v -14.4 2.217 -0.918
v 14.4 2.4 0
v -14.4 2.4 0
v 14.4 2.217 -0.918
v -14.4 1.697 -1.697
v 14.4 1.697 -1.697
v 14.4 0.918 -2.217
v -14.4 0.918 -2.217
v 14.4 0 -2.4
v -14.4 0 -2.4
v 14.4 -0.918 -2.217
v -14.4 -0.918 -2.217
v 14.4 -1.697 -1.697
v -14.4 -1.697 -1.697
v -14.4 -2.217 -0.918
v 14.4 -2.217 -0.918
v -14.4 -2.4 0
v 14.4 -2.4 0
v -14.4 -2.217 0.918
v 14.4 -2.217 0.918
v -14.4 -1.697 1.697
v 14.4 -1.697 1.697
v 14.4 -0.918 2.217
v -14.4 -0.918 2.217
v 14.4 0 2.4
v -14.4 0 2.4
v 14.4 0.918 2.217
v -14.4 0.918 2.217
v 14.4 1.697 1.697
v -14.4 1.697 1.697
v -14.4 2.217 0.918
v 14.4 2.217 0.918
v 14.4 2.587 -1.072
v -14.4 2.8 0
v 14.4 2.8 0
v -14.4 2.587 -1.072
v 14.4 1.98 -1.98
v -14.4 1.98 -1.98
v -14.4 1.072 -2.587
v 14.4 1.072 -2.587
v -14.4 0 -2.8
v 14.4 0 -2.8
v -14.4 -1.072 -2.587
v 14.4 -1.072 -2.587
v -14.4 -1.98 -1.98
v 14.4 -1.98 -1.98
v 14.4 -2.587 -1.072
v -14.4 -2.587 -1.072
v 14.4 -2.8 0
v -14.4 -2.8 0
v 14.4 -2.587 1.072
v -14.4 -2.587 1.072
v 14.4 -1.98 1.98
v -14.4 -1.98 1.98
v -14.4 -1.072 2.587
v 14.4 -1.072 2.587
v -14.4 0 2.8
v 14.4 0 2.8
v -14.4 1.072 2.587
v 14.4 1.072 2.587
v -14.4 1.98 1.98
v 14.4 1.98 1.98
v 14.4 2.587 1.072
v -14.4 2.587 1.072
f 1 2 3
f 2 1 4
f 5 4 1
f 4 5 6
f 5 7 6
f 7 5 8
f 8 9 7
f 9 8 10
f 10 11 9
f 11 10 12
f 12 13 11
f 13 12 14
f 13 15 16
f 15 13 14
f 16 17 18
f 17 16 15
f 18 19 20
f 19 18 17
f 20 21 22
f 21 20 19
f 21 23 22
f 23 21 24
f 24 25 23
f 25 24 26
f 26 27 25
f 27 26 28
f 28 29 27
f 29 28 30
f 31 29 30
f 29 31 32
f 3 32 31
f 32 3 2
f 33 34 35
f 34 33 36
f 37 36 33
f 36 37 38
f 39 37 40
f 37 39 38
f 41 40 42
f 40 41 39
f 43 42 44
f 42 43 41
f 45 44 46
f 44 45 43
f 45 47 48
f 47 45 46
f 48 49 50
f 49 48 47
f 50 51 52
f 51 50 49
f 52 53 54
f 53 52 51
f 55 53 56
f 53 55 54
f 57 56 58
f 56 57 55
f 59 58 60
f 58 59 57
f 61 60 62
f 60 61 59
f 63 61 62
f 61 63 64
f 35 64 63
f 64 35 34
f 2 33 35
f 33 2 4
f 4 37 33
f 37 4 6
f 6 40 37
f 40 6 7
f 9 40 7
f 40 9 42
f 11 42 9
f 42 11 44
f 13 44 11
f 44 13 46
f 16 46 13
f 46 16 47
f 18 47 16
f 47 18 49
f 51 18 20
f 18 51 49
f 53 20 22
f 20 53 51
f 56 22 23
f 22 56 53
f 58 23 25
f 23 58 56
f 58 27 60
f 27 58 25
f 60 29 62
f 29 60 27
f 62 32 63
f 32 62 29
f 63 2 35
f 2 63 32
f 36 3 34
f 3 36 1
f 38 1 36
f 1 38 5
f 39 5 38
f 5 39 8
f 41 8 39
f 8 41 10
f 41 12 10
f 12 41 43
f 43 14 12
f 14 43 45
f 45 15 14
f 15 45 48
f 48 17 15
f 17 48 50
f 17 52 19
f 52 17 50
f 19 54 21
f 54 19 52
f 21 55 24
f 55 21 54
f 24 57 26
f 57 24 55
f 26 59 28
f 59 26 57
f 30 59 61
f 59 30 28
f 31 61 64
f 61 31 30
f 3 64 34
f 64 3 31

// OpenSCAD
// file: ../p/4-4edge.scad
use <../lib.scad>
function ldraw_lib__4_4edge() = [
// 0 Circle 1.0
// 0 Name: 4-4edge.dat
// 0 Author: James Jessiman
// 0 !LDRAW_ORG Primitive UPDATE 2017-01
// 0 !LICENSE Licensed under CC BY 2.0 and CC BY 4.0 : see CAreadme.txt
// 
// 0 BFC CERTIFY CCW
  [0,"BFC","CERTIFY"],
  [0,"BFC","CCW"],
// 
// 0 !HISTORY 1998-12-15 [PTadmin] Official Update 1998-10
// 0 !HISTORY 2005-12-28 [PTadmin] Official Update 2005-01
// 0 !HISTORY 2007-06-24 [PTadmin] Header formatted for Contributor Agreement
// 0 !HISTORY 2008-07-01 [PTadmin] Official Update 2008-01
// 0 !HISTORY 2017-01-15 [Steffen] BFCed
// 0 !HISTORY 2017-12-30 [PTadmin] Official Update 2017-01
// 
// 
// 2 24 1 0 0 0.9239 0 0.3827
  [2,24,1,0,0,0.9239,0,0.3827],
// 2 24 0.9239 0 0.3827 0.7071 0 0.7071
  [2,24,0.9239,0,0.3827,0.7071,0,0.7071],
// 2 24 0.7071 0 0.7071 0.3827 0 0.9239
  [2,24,0.7071,0,0.7071,0.3827,0,0.9239],
// 2 24 0.3827 0 0.9239 0 0 1
  [2,24,0.3827,0,0.9239,0,0,1],
// 2 24 0 0 1 -0.3827 0 0.9239
  [2,24,0,0,1,-0.3827,0,0.9239],
// 2 24 -0.3827 0 0.9239 -0.7071 0 0.7071
  [2,24,-0.3827,0,0.9239,-0.7071,0,0.7071],
// 2 24 -0.7071 0 0.7071 -0.9239 0 0.3827
  [2,24,-0.7071,0,0.7071,-0.9239,0,0.3827],
// 2 24 -0.9239 0 0.3827 -1 0 -0
  [2,24,-0.9239,0,0.3827,-1,0,-0],
// 2 24 -1 0 -0 -0.9239 0 -0.3827
  [2,24,-1,0,-0,-0.9239,0,-0.3827],
// 2 24 -0.9239 0 -0.3827 -0.7071 0 -0.7071
  [2,24,-0.9239,0,-0.3827,-0.7071,0,-0.7071],
// 2 24 -0.7071 0 -0.7071 -0.3827 0 -0.9239
  [2,24,-0.7071,0,-0.7071,-0.3827,0,-0.9239],
// 2 24 -0.3827 0 -0.9239 0 0 -1
  [2,24,-0.3827,0,-0.9239,0,0,-1],
// 2 24 0 0 -1 0.3827 0 -0.9239
  [2,24,0,0,-1,0.3827,0,-0.9239],
// 2 24 0.3827 0 -0.9239 0.7071 0 -0.7071
  [2,24,0.3827,0,-0.9239,0.7071,0,-0.7071],
// 2 24 0.7071 0 -0.7071 0.9239 0 -0.3827
  [2,24,0.7071,0,-0.7071,0.9239,0,-0.3827],
// 2 24 0.9239 0 -0.3827 1 0 0
  [2,24,0.9239,0,-0.3827,1,0,0],
];
module ldraw_lib__4_4edge(step=0, col=false, unit=2/5, alt=false, line=0.2, solid=!$preview)
    makepoly(ldraw_lib__4_4edge(), step=step, col=col, unit=unit, alt=alt, line=line, solid=solid);
ldraw_lib__4_4edge(line=0.2);
// file: ../p/4-4cyli.scad
use <../lib.scad>
function ldraw_lib__4_4cyli() = [
// 0 Cylinder 1.0
// 0 Name: 4-4cyli.dat
// 0 Author: James Jessiman
// 0 !LDRAW_ORG Primitive UPDATE 2005-01
// 0 !LICENSE Licensed under CC BY 2.0 and CC BY 4.0 : see CAreadme.txt
// 
// 0 BFC CERTIFY CCW
  [0,"BFC","CERTIFY"],
  [0,"BFC","CCW"],
// 
// 0 !HISTORY 1998-12-15 [PTadmin] Official Update 1998-10
// 0 !HISTORY 2002-03-23 [sbliss] Added BFC statement; merged headers from files in distributions LDraw 0.27 and Complete.
// 0 !HISTORY 2002-04-25 [PTadmin] Official Update 2002-02
// 0 !HISTORY 2004-12-14 [guyvivan] BFC CCW
// 0 !HISTORY 2005-12-28 [PTadmin] Official Update 2005-01
// 0 !HISTORY 2007-06-24 [PTadmin] Header formatted for Contributor Agreement
// 0 !HISTORY 2008-07-01 [PTadmin] Official Update 2008-01
// 
// 
// 4 16 1 1 0 0.9239 1 0.3827 0.9239 0 0.3827 1 0 0
  [4,16,1,1,0,0.9239,1,0.3827,0.9239,0,0.3827,1,0,0],
// 5 24 1 0 0 1 1 0 0.9239 0 0.3827 0.9239 0 -0.3827
  [5,24,1,0,0,1,1,0,0.9239,0,0.3827,0.9239,0,-0.3827],
// 4 16 0.9239 1 0.3827 0.7071 1 0.7071 0.7071 0 0.7071 0.9239 0 0.3827
  [4,16,0.9239,1,0.3827,0.7071,1,0.7071,0.7071,0,0.7071,0.9239,0,0.3827],
// 5 24 0.9239 0 0.3827 0.9239 1 0.3827 0.7071 0 0.7071 1 0 0
  [5,24,0.9239,0,0.3827,0.9239,1,0.3827,0.7071,0,0.7071,1,0,0],
// 4 16 0.7071 1 0.7071 0.3827 1 0.9239 0.3827 0 0.9239 0.7071 0 0.7071
  [4,16,0.7071,1,0.7071,0.3827,1,0.9239,0.3827,0,0.9239,0.7071,0,0.7071],
// 5 24 0.7071 0 0.7071 0.7071 1 0.7071 0.3827 0 0.9239 0.9239 0 0.3827
  [5,24,0.7071,0,0.7071,0.7071,1,0.7071,0.3827,0,0.9239,0.9239,0,0.3827],
// 4 16 0.3827 1 0.9239 0 1 1 0 0 1 0.3827 0 0.9239
  [4,16,0.3827,1,0.9239,0,1,1,0,0,1,0.3827,0,0.9239],
// 5 24 0.3827 0 0.9239 0.3827 1 0.9239 0 0 1 0.7071 0 0.7071
  [5,24,0.3827,0,0.9239,0.3827,1,0.9239,0,0,1,0.7071,0,0.7071],
// 4 16 0 1 1 -0.3827 1 0.9239 -0.3827 0 0.9239 0 0 1
  [4,16,0,1,1,-0.3827,1,0.9239,-0.3827,0,0.9239,0,0,1],
// 5 24 0 0 1 0 1 1 -0.3827 0 0.9239 0.3827 0 0.9239
  [5,24,0,0,1,0,1,1,-0.3827,0,0.9239,0.3827,0,0.9239],
// 4 16 -0.3827 1 0.9239 -0.7071 1 0.7071 -0.7071 0 0.7071 -0.3827 0 0.9239
  [4,16,-0.3827,1,0.9239,-0.7071,1,0.7071,-0.7071,0,0.7071,-0.3827,0,0.9239],
// 5 24 -0.3827 0 0.9239 -0.3827 1 0.9239 -0.7071 0 0.7071 0 0 1
  [5,24,-0.3827,0,0.9239,-0.3827,1,0.9239,-0.7071,0,0.7071,0,0,1],
// 4 16 -0.7071 1 0.7071 -0.9239 1 0.3827 -0.9239 0 0.3827 -0.7071 0 0.7071
  [4,16,-0.7071,1,0.7071,-0.9239,1,0.3827,-0.9239,0,0.3827,-0.7071,0,0.7071],
// 5 24 -0.7071 0 0.7071 -0.7071 1 0.7071 -0.9239 0 0.3827 -0.3827 0 0.9239
  [5,24,-0.7071,0,0.7071,-0.7071,1,0.7071,-0.9239,0,0.3827,-0.3827,0,0.9239],
// 4 16 -0.9239 1 0.3827 -1 1 0 -1 0 0 -0.9239 0 0.3827
  [4,16,-0.9239,1,0.3827,-1,1,0,-1,0,0,-0.9239,0,0.3827],
// 5 24 -0.9239 0 0.3827 -0.9239 1 0.3827 -1 0 0 -0.7071 0 0.7071
  [5,24,-0.9239,0,0.3827,-0.9239,1,0.3827,-1,0,0,-0.7071,0,0.7071],
// 4 16 -1 1 0 -0.9239 1 -0.3827 -0.9239 0 -0.3827 -1 0 0
  [4,16,-1,1,0,-0.9239,1,-0.3827,-0.9239,0,-0.3827,-1,0,0],
// 5 24 -1 0 0 -1 1 0 -0.9239 0 -0.3827 -0.9239 0 0.3827
  [5,24,-1,0,0,-1,1,0,-0.9239,0,-0.3827,-0.9239,0,0.3827],
// 4 16 -0.9239 1 -0.3827 -0.7071 1 -0.7071 -0.7071 0 -0.7071 -0.9239 0 -0.3827
  [4,16,-0.9239,1,-0.3827,-0.7071,1,-0.7071,-0.7071,0,-0.7071,-0.9239,0,-0.3827],
// 5 24 -0.9239 0 -0.3827 -0.9239 1 -0.3827 -0.7071 0 -0.7071 -1 0 0
  [5,24,-0.9239,0,-0.3827,-0.9239,1,-0.3827,-0.7071,0,-0.7071,-1,0,0],
// 4 16 -0.7071 1 -0.7071 -0.3827 1 -0.9239 -0.3827 0 -0.9239 -0.7071 0 -0.7071
  [4,16,-0.7071,1,-0.7071,-0.3827,1,-0.9239,-0.3827,0,-0.9239,-0.7071,0,-0.7071],
// 5 24 -0.7071 0 -0.7071 -0.7071 1 -0.7071 -0.3827 0 -0.9239 -0.9239 0 -0.3827
  [5,24,-0.7071,0,-0.7071,-0.7071,1,-0.7071,-0.3827,0,-0.9239,-0.9239,0,-0.3827],
// 4 16 -0.3827 1 -0.9239 0 1 -1 0 0 -1 -0.3827 0 -0.9239
  [4,16,-0.3827,1,-0.9239,0,1,-1,0,0,-1,-0.3827,0,-0.9239],
// 5 24 -0.3827 0 -0.9239 -0.3827 1 -0.9239 0 0 -1 -0.7071 0 -0.7071
  [5,24,-0.3827,0,-0.9239,-0.3827,1,-0.9239,0,0,-1,-0.7071,0,-0.7071],
// 4 16 0 1 -1 0.3827 1 -0.9239 0.3827 0 -0.9239 0 0 -1
  [4,16,0,1,-1,0.3827,1,-0.9239,0.3827,0,-0.9239,0,0,-1],
// 5 24 0 0 -1 0 1 -1 0.3827 0 -0.9239 -0.3827 0 -0.9239
  [5,24,0,0,-1,0,1,-1,0.3827,0,-0.9239,-0.3827,0,-0.9239],
// 4 16 0.3827 1 -0.9239 0.7071 1 -0.7071 0.7071 0 -0.7071 0.3827 0 -0.9239
  [4,16,0.3827,1,-0.9239,0.7071,1,-0.7071,0.7071,0,-0.7071,0.3827,0,-0.9239],
// 5 24 0.3827 0 -0.9239 0.3827 1 -0.9239 0.7071 0 -0.7071 0 0 -1
  [5,24,0.3827,0,-0.9239,0.3827,1,-0.9239,0.7071,0,-0.7071,0,0,-1],
// 4 16 0.7071 1 -0.7071 0.9239 1 -0.3827 0.9239 0 -0.3827 0.7071 0 -0.7071
  [4,16,0.7071,1,-0.7071,0.9239,1,-0.3827,0.9239,0,-0.3827,0.7071,0,-0.7071],
// 5 24 0.7071 0 -0.7071 0.7071 1 -0.7071 0.9239 0 -0.3827 0.3827 0 -0.9239
  [5,24,0.7071,0,-0.7071,0.7071,1,-0.7071,0.9239,0,-0.3827,0.3827,0,-0.9239],
// 4 16 0.9239 1 -0.3827 1 1 0 1 0 0 0.9239 0 -0.3827
  [4,16,0.9239,1,-0.3827,1,1,0,1,0,0,0.9239,0,-0.3827],
// 5 24 0.9239 0 -0.3827 0.9239 1 -0.3827 1 0 0 0.7071 0 -0.7071
  [5,24,0.9239,0,-0.3827,0.9239,1,-0.3827,1,0,0,0.7071,0,-0.7071],
// 0
];
module ldraw_lib__4_4cyli(step=0, col=false, unit=2/5, alt=false, line=0.2, solid=!$preview)
    makepoly(ldraw_lib__4_4cyli(), step=step, col=col, unit=unit, alt=alt, line=line, solid=solid);
ldraw_lib__4_4cyli(line=0.2);
// file: ../p/4-4ring6.scad
use <../lib.scad>
function ldraw_lib__4_4ring6() = [
// 0 Ring  6 x 1.0
// 0 Name: 4-4ring6.dat
// 0 Author: Mark Kennedy [mkennedy]
// 0 !LDRAW_ORG Primitive UPDATE 2012-01
// 0 !LICENSE Licensed under CC BY 2.0 and CC BY 4.0 : see CAreadme.txt
// 
// 0 BFC CERTIFY CCW
  [0,"BFC","CERTIFY"],
  [0,"BFC","CCW"],
// 
// 0 !HISTORY 2001-10-23 [pneaster] resequenced quads, corrected winding.
// 0 !HISTORY 2001-11-30 [PTadmin] Official Update 2001-02
// 0 !HISTORY 2007-06-24 [PTadmin] Header formatted for Contributor Agreement
// 0 !HISTORY 2008-07-01 [PTadmin] Official Update 2008-01
// 0 !HISTORY 2012-02-16 [Philo] Changed to CCW
// 0 !HISTORY 2012-03-30 [PTadmin] Official Update 2012-01
// 
// 
// 4 16 7 0 0 6.4672 0 2.6788 5.5433 0 2.2961 6 0 0
  [4,16,7,0,0,6.4672,0,2.6788,5.5433,0,2.2961,6,0,0],
// 4 16 6.4672 0 2.6788 4.9497 0 4.9497 4.2426 0 4.2426 5.5433 0 2.2961
  [4,16,6.4672,0,2.6788,4.9497,0,4.9497,4.2426,0,4.2426,5.5433,0,2.2961],
// 4 16 4.9497 0 4.9497 2.6788 0 6.4672 2.2961 0 5.5433 4.2426 0 4.2426
  [4,16,4.9497,0,4.9497,2.6788,0,6.4672,2.2961,0,5.5433,4.2426,0,4.2426],
// 4 16 2.6788 0 6.4672 0 0 7 0 0 6 2.2961 0 5.5433
  [4,16,2.6788,0,6.4672,0,0,7,0,0,6,2.2961,0,5.5433],
// 4 16 0 0 7 -2.6788 0 6.4672 -2.2961 0 5.5433 0 0 6
  [4,16,0,0,7,-2.6788,0,6.4672,-2.2961,0,5.5433,0,0,6],
// 4 16 -2.6788 0 6.4672 -4.9497 0 4.9497 -4.2426 0 4.2426 -2.2961 0 5.5433
  [4,16,-2.6788,0,6.4672,-4.9497,0,4.9497,-4.2426,0,4.2426,-2.2961,0,5.5433],
// 4 16 -4.9497 0 4.9497 -6.4672 0 2.6788 -5.5433 0 2.2961 -4.2426 0 4.2426
  [4,16,-4.9497,0,4.9497,-6.4672,0,2.6788,-5.5433,0,2.2961,-4.2426,0,4.2426],
// 4 16 -6.4672 0 2.6788 -7 0 0 -6 0 0 -5.5433 0 2.2961
  [4,16,-6.4672,0,2.6788,-7,0,0,-6,0,0,-5.5433,0,2.2961],
// 4 16 -7 0 0 -6.4672 0 -2.6788 -5.5433 0 -2.2961 -6 0 0
  [4,16,-7,0,0,-6.4672,0,-2.6788,-5.5433,0,-2.2961,-6,0,0],
// 4 16 -6.4672 0 -2.6788 -4.9497 0 -4.9497 -4.2426 0 -4.2426 -5.5433 0 -2.2961
  [4,16,-6.4672,0,-2.6788,-4.9497,0,-4.9497,-4.2426,0,-4.2426,-5.5433,0,-2.2961],
// 4 16 -4.9497 0 -4.9497 -2.6788 0 -6.4672 -2.2961 0 -5.5433 -4.2426 0 -4.2426
  [4,16,-4.9497,0,-4.9497,-2.6788,0,-6.4672,-2.2961,0,-5.5433,-4.2426,0,-4.2426],
// 4 16 -2.6788 0 -6.4672 0 0 -7 0 0 -6 -2.2961 0 -5.5433
  [4,16,-2.6788,0,-6.4672,0,0,-7,0,0,-6,-2.2961,0,-5.5433],
// 4 16 0 0 -7 2.6788 0 -6.4672 2.2961 0 -5.5433 0 0 -6
  [4,16,0,0,-7,2.6788,0,-6.4672,2.2961,0,-5.5433,0,0,-6],
// 4 16 2.6788 0 -6.4672 4.9497 0 -4.9497 4.2426 0 -4.2426 2.2961 0 -5.5433
  [4,16,2.6788,0,-6.4672,4.9497,0,-4.9497,4.2426,0,-4.2426,2.2961,0,-5.5433],
// 4 16 4.9497 0 -4.9497 6.4672 0 -2.6788 5.5433 0 -2.2961 4.2426 0 -4.2426
  [4,16,4.9497,0,-4.9497,6.4672,0,-2.6788,5.5433,0,-2.2961,4.2426,0,-4.2426],
// 4 16 6.4672 0 -2.6788 7 0 0 6 0 0 5.5433 0 -2.2961
  [4,16,6.4672,0,-2.6788,7,0,0,6,0,0,5.5433,0,-2.2961],
];
module ldraw_lib__4_4ring6(step=0, col=false, unit=2/5, alt=false, line=0.2, solid=!$preview)
    makepoly(ldraw_lib__4_4ring6(), step=step, col=col, unit=unit, alt=alt, line=line, solid=solid);
ldraw_lib__4_4ring6(line=0.2);
// file: ../p/4-4cylo.scad
use <../lib.scad>
use <4-4cyli.scad>
use <4-4edge.scad>
function ldraw_lib__4_4cylo() = [
// 0 Cylinder Open 1.0
// 0 Name: 4-4cylo.dat
// 0 Author: Mark Kennedy [mkennedy]
// 0 !LDRAW_ORG Primitive UPDATE 2010-01
// 0 !LICENSE Licensed under CC BY 2.0 and CC BY 4.0 : see CAreadme.txt
// 
// 0 BFC CERTIFY CCW
  [0,"BFC","CERTIFY"],
  [0,"BFC","CCW"],
// 
// 0 !HISTORY 2010-04-05 [PTadmin] Official Update 2010-01
// 
// 
// 1 16 0 0 0 1 0 0 0 1 0 0 0 1 4-4edge.dat
  [1,16,0,0,0,1,0,0,0,1,0,0,0,1, ldraw_lib__4_4edge()],
// 1 16 0 1 0 1 0 0 0 1 0 0 0 1 4-4edge.dat
  [1,16,0,1,0,1,0,0,0,1,0,0,0,1, ldraw_lib__4_4edge()],
// 1 16 0 0 0 1 0 0 0 1 0 0 0 1 4-4cyli.dat
  [1,16,0,0,0,1,0,0,0,1,0,0,0,1, ldraw_lib__4_4cyli()],
// 0
];
module ldraw_lib__4_4cylo(step=0, col=false, unit=2/5, alt=false, line=0.2, solid=!$preview)
    makepoly(ldraw_lib__4_4cylo(), step=step, col=col, unit=unit, alt=alt, line=line, solid=solid);
ldraw_lib__4_4cylo(line=0.2);
// main file
use <../lib.scad>
use <../p/4-4cylo.scad>
use <../p/4-4ring6.scad>
function ldraw_lib__u9290() = [
// 0 ~Electric Motor Case  4 x 12 x  3.333 Type 2 - Axle Bush 1
// 0 Name: u9290.dat
// 0 Author: Michael Heidemann [mikeheide]
// 0 !LDRAW_ORG Part UPDATE 2015-01
// 0 !LICENSE Licensed under CC BY 2.0 and CC BY 4.0 : see CAreadme.txt
// 
// 0 BFC CERTIFY CW
  [0,"BFC","CERTIFY"],
  [0,"BFC","CW"],
// 
// 0 !HISTORY 2015-10-11 [PTadmin] Official Update 2015-01
// 
// 
// 0 BFC INVERTNEXT
  [0,"BFC","INVERTNEXT"],
// 1 16 36 0 0 0 -72 0 0 0 6 6 0 0 4-4cylo.dat
  [1,16,36,0,0,0,-72,0,0,0,6,6,0,0, ldraw_lib__4_4cylo()],
// 1 16 36 0 0 0 -72 0 0 0 7 7 0 0 4-4cylo.dat
  [1,16,36,0,0,0,-72,0,0,0,7,7,0,0, ldraw_lib__4_4cylo()],
// 1 16 36 0 0 0 -1 0 0 0 1 1 0 0 4-4ring6.dat
  [1,16,36,0,0,0,-1,0,0,0,1,1,0,0, ldraw_lib__4_4ring6()],
// 1 16 -36 0 0 0 1 0 0 0 1 1 0 0 4-4ring6.dat
  [1,16,-36,0,0,0,1,0,0,0,1,1,0,0, ldraw_lib__4_4ring6()],
];
module ldraw_lib__u9290(step=0, col=false, unit=2/5, alt=false, line=0.2, solid=!$preview)
    makepoly(ldraw_lib__u9290(), step=step, col=col, unit=unit, alt=alt, line=line, solid=solid);
ldraw_lib__u9290(line=0.2);
